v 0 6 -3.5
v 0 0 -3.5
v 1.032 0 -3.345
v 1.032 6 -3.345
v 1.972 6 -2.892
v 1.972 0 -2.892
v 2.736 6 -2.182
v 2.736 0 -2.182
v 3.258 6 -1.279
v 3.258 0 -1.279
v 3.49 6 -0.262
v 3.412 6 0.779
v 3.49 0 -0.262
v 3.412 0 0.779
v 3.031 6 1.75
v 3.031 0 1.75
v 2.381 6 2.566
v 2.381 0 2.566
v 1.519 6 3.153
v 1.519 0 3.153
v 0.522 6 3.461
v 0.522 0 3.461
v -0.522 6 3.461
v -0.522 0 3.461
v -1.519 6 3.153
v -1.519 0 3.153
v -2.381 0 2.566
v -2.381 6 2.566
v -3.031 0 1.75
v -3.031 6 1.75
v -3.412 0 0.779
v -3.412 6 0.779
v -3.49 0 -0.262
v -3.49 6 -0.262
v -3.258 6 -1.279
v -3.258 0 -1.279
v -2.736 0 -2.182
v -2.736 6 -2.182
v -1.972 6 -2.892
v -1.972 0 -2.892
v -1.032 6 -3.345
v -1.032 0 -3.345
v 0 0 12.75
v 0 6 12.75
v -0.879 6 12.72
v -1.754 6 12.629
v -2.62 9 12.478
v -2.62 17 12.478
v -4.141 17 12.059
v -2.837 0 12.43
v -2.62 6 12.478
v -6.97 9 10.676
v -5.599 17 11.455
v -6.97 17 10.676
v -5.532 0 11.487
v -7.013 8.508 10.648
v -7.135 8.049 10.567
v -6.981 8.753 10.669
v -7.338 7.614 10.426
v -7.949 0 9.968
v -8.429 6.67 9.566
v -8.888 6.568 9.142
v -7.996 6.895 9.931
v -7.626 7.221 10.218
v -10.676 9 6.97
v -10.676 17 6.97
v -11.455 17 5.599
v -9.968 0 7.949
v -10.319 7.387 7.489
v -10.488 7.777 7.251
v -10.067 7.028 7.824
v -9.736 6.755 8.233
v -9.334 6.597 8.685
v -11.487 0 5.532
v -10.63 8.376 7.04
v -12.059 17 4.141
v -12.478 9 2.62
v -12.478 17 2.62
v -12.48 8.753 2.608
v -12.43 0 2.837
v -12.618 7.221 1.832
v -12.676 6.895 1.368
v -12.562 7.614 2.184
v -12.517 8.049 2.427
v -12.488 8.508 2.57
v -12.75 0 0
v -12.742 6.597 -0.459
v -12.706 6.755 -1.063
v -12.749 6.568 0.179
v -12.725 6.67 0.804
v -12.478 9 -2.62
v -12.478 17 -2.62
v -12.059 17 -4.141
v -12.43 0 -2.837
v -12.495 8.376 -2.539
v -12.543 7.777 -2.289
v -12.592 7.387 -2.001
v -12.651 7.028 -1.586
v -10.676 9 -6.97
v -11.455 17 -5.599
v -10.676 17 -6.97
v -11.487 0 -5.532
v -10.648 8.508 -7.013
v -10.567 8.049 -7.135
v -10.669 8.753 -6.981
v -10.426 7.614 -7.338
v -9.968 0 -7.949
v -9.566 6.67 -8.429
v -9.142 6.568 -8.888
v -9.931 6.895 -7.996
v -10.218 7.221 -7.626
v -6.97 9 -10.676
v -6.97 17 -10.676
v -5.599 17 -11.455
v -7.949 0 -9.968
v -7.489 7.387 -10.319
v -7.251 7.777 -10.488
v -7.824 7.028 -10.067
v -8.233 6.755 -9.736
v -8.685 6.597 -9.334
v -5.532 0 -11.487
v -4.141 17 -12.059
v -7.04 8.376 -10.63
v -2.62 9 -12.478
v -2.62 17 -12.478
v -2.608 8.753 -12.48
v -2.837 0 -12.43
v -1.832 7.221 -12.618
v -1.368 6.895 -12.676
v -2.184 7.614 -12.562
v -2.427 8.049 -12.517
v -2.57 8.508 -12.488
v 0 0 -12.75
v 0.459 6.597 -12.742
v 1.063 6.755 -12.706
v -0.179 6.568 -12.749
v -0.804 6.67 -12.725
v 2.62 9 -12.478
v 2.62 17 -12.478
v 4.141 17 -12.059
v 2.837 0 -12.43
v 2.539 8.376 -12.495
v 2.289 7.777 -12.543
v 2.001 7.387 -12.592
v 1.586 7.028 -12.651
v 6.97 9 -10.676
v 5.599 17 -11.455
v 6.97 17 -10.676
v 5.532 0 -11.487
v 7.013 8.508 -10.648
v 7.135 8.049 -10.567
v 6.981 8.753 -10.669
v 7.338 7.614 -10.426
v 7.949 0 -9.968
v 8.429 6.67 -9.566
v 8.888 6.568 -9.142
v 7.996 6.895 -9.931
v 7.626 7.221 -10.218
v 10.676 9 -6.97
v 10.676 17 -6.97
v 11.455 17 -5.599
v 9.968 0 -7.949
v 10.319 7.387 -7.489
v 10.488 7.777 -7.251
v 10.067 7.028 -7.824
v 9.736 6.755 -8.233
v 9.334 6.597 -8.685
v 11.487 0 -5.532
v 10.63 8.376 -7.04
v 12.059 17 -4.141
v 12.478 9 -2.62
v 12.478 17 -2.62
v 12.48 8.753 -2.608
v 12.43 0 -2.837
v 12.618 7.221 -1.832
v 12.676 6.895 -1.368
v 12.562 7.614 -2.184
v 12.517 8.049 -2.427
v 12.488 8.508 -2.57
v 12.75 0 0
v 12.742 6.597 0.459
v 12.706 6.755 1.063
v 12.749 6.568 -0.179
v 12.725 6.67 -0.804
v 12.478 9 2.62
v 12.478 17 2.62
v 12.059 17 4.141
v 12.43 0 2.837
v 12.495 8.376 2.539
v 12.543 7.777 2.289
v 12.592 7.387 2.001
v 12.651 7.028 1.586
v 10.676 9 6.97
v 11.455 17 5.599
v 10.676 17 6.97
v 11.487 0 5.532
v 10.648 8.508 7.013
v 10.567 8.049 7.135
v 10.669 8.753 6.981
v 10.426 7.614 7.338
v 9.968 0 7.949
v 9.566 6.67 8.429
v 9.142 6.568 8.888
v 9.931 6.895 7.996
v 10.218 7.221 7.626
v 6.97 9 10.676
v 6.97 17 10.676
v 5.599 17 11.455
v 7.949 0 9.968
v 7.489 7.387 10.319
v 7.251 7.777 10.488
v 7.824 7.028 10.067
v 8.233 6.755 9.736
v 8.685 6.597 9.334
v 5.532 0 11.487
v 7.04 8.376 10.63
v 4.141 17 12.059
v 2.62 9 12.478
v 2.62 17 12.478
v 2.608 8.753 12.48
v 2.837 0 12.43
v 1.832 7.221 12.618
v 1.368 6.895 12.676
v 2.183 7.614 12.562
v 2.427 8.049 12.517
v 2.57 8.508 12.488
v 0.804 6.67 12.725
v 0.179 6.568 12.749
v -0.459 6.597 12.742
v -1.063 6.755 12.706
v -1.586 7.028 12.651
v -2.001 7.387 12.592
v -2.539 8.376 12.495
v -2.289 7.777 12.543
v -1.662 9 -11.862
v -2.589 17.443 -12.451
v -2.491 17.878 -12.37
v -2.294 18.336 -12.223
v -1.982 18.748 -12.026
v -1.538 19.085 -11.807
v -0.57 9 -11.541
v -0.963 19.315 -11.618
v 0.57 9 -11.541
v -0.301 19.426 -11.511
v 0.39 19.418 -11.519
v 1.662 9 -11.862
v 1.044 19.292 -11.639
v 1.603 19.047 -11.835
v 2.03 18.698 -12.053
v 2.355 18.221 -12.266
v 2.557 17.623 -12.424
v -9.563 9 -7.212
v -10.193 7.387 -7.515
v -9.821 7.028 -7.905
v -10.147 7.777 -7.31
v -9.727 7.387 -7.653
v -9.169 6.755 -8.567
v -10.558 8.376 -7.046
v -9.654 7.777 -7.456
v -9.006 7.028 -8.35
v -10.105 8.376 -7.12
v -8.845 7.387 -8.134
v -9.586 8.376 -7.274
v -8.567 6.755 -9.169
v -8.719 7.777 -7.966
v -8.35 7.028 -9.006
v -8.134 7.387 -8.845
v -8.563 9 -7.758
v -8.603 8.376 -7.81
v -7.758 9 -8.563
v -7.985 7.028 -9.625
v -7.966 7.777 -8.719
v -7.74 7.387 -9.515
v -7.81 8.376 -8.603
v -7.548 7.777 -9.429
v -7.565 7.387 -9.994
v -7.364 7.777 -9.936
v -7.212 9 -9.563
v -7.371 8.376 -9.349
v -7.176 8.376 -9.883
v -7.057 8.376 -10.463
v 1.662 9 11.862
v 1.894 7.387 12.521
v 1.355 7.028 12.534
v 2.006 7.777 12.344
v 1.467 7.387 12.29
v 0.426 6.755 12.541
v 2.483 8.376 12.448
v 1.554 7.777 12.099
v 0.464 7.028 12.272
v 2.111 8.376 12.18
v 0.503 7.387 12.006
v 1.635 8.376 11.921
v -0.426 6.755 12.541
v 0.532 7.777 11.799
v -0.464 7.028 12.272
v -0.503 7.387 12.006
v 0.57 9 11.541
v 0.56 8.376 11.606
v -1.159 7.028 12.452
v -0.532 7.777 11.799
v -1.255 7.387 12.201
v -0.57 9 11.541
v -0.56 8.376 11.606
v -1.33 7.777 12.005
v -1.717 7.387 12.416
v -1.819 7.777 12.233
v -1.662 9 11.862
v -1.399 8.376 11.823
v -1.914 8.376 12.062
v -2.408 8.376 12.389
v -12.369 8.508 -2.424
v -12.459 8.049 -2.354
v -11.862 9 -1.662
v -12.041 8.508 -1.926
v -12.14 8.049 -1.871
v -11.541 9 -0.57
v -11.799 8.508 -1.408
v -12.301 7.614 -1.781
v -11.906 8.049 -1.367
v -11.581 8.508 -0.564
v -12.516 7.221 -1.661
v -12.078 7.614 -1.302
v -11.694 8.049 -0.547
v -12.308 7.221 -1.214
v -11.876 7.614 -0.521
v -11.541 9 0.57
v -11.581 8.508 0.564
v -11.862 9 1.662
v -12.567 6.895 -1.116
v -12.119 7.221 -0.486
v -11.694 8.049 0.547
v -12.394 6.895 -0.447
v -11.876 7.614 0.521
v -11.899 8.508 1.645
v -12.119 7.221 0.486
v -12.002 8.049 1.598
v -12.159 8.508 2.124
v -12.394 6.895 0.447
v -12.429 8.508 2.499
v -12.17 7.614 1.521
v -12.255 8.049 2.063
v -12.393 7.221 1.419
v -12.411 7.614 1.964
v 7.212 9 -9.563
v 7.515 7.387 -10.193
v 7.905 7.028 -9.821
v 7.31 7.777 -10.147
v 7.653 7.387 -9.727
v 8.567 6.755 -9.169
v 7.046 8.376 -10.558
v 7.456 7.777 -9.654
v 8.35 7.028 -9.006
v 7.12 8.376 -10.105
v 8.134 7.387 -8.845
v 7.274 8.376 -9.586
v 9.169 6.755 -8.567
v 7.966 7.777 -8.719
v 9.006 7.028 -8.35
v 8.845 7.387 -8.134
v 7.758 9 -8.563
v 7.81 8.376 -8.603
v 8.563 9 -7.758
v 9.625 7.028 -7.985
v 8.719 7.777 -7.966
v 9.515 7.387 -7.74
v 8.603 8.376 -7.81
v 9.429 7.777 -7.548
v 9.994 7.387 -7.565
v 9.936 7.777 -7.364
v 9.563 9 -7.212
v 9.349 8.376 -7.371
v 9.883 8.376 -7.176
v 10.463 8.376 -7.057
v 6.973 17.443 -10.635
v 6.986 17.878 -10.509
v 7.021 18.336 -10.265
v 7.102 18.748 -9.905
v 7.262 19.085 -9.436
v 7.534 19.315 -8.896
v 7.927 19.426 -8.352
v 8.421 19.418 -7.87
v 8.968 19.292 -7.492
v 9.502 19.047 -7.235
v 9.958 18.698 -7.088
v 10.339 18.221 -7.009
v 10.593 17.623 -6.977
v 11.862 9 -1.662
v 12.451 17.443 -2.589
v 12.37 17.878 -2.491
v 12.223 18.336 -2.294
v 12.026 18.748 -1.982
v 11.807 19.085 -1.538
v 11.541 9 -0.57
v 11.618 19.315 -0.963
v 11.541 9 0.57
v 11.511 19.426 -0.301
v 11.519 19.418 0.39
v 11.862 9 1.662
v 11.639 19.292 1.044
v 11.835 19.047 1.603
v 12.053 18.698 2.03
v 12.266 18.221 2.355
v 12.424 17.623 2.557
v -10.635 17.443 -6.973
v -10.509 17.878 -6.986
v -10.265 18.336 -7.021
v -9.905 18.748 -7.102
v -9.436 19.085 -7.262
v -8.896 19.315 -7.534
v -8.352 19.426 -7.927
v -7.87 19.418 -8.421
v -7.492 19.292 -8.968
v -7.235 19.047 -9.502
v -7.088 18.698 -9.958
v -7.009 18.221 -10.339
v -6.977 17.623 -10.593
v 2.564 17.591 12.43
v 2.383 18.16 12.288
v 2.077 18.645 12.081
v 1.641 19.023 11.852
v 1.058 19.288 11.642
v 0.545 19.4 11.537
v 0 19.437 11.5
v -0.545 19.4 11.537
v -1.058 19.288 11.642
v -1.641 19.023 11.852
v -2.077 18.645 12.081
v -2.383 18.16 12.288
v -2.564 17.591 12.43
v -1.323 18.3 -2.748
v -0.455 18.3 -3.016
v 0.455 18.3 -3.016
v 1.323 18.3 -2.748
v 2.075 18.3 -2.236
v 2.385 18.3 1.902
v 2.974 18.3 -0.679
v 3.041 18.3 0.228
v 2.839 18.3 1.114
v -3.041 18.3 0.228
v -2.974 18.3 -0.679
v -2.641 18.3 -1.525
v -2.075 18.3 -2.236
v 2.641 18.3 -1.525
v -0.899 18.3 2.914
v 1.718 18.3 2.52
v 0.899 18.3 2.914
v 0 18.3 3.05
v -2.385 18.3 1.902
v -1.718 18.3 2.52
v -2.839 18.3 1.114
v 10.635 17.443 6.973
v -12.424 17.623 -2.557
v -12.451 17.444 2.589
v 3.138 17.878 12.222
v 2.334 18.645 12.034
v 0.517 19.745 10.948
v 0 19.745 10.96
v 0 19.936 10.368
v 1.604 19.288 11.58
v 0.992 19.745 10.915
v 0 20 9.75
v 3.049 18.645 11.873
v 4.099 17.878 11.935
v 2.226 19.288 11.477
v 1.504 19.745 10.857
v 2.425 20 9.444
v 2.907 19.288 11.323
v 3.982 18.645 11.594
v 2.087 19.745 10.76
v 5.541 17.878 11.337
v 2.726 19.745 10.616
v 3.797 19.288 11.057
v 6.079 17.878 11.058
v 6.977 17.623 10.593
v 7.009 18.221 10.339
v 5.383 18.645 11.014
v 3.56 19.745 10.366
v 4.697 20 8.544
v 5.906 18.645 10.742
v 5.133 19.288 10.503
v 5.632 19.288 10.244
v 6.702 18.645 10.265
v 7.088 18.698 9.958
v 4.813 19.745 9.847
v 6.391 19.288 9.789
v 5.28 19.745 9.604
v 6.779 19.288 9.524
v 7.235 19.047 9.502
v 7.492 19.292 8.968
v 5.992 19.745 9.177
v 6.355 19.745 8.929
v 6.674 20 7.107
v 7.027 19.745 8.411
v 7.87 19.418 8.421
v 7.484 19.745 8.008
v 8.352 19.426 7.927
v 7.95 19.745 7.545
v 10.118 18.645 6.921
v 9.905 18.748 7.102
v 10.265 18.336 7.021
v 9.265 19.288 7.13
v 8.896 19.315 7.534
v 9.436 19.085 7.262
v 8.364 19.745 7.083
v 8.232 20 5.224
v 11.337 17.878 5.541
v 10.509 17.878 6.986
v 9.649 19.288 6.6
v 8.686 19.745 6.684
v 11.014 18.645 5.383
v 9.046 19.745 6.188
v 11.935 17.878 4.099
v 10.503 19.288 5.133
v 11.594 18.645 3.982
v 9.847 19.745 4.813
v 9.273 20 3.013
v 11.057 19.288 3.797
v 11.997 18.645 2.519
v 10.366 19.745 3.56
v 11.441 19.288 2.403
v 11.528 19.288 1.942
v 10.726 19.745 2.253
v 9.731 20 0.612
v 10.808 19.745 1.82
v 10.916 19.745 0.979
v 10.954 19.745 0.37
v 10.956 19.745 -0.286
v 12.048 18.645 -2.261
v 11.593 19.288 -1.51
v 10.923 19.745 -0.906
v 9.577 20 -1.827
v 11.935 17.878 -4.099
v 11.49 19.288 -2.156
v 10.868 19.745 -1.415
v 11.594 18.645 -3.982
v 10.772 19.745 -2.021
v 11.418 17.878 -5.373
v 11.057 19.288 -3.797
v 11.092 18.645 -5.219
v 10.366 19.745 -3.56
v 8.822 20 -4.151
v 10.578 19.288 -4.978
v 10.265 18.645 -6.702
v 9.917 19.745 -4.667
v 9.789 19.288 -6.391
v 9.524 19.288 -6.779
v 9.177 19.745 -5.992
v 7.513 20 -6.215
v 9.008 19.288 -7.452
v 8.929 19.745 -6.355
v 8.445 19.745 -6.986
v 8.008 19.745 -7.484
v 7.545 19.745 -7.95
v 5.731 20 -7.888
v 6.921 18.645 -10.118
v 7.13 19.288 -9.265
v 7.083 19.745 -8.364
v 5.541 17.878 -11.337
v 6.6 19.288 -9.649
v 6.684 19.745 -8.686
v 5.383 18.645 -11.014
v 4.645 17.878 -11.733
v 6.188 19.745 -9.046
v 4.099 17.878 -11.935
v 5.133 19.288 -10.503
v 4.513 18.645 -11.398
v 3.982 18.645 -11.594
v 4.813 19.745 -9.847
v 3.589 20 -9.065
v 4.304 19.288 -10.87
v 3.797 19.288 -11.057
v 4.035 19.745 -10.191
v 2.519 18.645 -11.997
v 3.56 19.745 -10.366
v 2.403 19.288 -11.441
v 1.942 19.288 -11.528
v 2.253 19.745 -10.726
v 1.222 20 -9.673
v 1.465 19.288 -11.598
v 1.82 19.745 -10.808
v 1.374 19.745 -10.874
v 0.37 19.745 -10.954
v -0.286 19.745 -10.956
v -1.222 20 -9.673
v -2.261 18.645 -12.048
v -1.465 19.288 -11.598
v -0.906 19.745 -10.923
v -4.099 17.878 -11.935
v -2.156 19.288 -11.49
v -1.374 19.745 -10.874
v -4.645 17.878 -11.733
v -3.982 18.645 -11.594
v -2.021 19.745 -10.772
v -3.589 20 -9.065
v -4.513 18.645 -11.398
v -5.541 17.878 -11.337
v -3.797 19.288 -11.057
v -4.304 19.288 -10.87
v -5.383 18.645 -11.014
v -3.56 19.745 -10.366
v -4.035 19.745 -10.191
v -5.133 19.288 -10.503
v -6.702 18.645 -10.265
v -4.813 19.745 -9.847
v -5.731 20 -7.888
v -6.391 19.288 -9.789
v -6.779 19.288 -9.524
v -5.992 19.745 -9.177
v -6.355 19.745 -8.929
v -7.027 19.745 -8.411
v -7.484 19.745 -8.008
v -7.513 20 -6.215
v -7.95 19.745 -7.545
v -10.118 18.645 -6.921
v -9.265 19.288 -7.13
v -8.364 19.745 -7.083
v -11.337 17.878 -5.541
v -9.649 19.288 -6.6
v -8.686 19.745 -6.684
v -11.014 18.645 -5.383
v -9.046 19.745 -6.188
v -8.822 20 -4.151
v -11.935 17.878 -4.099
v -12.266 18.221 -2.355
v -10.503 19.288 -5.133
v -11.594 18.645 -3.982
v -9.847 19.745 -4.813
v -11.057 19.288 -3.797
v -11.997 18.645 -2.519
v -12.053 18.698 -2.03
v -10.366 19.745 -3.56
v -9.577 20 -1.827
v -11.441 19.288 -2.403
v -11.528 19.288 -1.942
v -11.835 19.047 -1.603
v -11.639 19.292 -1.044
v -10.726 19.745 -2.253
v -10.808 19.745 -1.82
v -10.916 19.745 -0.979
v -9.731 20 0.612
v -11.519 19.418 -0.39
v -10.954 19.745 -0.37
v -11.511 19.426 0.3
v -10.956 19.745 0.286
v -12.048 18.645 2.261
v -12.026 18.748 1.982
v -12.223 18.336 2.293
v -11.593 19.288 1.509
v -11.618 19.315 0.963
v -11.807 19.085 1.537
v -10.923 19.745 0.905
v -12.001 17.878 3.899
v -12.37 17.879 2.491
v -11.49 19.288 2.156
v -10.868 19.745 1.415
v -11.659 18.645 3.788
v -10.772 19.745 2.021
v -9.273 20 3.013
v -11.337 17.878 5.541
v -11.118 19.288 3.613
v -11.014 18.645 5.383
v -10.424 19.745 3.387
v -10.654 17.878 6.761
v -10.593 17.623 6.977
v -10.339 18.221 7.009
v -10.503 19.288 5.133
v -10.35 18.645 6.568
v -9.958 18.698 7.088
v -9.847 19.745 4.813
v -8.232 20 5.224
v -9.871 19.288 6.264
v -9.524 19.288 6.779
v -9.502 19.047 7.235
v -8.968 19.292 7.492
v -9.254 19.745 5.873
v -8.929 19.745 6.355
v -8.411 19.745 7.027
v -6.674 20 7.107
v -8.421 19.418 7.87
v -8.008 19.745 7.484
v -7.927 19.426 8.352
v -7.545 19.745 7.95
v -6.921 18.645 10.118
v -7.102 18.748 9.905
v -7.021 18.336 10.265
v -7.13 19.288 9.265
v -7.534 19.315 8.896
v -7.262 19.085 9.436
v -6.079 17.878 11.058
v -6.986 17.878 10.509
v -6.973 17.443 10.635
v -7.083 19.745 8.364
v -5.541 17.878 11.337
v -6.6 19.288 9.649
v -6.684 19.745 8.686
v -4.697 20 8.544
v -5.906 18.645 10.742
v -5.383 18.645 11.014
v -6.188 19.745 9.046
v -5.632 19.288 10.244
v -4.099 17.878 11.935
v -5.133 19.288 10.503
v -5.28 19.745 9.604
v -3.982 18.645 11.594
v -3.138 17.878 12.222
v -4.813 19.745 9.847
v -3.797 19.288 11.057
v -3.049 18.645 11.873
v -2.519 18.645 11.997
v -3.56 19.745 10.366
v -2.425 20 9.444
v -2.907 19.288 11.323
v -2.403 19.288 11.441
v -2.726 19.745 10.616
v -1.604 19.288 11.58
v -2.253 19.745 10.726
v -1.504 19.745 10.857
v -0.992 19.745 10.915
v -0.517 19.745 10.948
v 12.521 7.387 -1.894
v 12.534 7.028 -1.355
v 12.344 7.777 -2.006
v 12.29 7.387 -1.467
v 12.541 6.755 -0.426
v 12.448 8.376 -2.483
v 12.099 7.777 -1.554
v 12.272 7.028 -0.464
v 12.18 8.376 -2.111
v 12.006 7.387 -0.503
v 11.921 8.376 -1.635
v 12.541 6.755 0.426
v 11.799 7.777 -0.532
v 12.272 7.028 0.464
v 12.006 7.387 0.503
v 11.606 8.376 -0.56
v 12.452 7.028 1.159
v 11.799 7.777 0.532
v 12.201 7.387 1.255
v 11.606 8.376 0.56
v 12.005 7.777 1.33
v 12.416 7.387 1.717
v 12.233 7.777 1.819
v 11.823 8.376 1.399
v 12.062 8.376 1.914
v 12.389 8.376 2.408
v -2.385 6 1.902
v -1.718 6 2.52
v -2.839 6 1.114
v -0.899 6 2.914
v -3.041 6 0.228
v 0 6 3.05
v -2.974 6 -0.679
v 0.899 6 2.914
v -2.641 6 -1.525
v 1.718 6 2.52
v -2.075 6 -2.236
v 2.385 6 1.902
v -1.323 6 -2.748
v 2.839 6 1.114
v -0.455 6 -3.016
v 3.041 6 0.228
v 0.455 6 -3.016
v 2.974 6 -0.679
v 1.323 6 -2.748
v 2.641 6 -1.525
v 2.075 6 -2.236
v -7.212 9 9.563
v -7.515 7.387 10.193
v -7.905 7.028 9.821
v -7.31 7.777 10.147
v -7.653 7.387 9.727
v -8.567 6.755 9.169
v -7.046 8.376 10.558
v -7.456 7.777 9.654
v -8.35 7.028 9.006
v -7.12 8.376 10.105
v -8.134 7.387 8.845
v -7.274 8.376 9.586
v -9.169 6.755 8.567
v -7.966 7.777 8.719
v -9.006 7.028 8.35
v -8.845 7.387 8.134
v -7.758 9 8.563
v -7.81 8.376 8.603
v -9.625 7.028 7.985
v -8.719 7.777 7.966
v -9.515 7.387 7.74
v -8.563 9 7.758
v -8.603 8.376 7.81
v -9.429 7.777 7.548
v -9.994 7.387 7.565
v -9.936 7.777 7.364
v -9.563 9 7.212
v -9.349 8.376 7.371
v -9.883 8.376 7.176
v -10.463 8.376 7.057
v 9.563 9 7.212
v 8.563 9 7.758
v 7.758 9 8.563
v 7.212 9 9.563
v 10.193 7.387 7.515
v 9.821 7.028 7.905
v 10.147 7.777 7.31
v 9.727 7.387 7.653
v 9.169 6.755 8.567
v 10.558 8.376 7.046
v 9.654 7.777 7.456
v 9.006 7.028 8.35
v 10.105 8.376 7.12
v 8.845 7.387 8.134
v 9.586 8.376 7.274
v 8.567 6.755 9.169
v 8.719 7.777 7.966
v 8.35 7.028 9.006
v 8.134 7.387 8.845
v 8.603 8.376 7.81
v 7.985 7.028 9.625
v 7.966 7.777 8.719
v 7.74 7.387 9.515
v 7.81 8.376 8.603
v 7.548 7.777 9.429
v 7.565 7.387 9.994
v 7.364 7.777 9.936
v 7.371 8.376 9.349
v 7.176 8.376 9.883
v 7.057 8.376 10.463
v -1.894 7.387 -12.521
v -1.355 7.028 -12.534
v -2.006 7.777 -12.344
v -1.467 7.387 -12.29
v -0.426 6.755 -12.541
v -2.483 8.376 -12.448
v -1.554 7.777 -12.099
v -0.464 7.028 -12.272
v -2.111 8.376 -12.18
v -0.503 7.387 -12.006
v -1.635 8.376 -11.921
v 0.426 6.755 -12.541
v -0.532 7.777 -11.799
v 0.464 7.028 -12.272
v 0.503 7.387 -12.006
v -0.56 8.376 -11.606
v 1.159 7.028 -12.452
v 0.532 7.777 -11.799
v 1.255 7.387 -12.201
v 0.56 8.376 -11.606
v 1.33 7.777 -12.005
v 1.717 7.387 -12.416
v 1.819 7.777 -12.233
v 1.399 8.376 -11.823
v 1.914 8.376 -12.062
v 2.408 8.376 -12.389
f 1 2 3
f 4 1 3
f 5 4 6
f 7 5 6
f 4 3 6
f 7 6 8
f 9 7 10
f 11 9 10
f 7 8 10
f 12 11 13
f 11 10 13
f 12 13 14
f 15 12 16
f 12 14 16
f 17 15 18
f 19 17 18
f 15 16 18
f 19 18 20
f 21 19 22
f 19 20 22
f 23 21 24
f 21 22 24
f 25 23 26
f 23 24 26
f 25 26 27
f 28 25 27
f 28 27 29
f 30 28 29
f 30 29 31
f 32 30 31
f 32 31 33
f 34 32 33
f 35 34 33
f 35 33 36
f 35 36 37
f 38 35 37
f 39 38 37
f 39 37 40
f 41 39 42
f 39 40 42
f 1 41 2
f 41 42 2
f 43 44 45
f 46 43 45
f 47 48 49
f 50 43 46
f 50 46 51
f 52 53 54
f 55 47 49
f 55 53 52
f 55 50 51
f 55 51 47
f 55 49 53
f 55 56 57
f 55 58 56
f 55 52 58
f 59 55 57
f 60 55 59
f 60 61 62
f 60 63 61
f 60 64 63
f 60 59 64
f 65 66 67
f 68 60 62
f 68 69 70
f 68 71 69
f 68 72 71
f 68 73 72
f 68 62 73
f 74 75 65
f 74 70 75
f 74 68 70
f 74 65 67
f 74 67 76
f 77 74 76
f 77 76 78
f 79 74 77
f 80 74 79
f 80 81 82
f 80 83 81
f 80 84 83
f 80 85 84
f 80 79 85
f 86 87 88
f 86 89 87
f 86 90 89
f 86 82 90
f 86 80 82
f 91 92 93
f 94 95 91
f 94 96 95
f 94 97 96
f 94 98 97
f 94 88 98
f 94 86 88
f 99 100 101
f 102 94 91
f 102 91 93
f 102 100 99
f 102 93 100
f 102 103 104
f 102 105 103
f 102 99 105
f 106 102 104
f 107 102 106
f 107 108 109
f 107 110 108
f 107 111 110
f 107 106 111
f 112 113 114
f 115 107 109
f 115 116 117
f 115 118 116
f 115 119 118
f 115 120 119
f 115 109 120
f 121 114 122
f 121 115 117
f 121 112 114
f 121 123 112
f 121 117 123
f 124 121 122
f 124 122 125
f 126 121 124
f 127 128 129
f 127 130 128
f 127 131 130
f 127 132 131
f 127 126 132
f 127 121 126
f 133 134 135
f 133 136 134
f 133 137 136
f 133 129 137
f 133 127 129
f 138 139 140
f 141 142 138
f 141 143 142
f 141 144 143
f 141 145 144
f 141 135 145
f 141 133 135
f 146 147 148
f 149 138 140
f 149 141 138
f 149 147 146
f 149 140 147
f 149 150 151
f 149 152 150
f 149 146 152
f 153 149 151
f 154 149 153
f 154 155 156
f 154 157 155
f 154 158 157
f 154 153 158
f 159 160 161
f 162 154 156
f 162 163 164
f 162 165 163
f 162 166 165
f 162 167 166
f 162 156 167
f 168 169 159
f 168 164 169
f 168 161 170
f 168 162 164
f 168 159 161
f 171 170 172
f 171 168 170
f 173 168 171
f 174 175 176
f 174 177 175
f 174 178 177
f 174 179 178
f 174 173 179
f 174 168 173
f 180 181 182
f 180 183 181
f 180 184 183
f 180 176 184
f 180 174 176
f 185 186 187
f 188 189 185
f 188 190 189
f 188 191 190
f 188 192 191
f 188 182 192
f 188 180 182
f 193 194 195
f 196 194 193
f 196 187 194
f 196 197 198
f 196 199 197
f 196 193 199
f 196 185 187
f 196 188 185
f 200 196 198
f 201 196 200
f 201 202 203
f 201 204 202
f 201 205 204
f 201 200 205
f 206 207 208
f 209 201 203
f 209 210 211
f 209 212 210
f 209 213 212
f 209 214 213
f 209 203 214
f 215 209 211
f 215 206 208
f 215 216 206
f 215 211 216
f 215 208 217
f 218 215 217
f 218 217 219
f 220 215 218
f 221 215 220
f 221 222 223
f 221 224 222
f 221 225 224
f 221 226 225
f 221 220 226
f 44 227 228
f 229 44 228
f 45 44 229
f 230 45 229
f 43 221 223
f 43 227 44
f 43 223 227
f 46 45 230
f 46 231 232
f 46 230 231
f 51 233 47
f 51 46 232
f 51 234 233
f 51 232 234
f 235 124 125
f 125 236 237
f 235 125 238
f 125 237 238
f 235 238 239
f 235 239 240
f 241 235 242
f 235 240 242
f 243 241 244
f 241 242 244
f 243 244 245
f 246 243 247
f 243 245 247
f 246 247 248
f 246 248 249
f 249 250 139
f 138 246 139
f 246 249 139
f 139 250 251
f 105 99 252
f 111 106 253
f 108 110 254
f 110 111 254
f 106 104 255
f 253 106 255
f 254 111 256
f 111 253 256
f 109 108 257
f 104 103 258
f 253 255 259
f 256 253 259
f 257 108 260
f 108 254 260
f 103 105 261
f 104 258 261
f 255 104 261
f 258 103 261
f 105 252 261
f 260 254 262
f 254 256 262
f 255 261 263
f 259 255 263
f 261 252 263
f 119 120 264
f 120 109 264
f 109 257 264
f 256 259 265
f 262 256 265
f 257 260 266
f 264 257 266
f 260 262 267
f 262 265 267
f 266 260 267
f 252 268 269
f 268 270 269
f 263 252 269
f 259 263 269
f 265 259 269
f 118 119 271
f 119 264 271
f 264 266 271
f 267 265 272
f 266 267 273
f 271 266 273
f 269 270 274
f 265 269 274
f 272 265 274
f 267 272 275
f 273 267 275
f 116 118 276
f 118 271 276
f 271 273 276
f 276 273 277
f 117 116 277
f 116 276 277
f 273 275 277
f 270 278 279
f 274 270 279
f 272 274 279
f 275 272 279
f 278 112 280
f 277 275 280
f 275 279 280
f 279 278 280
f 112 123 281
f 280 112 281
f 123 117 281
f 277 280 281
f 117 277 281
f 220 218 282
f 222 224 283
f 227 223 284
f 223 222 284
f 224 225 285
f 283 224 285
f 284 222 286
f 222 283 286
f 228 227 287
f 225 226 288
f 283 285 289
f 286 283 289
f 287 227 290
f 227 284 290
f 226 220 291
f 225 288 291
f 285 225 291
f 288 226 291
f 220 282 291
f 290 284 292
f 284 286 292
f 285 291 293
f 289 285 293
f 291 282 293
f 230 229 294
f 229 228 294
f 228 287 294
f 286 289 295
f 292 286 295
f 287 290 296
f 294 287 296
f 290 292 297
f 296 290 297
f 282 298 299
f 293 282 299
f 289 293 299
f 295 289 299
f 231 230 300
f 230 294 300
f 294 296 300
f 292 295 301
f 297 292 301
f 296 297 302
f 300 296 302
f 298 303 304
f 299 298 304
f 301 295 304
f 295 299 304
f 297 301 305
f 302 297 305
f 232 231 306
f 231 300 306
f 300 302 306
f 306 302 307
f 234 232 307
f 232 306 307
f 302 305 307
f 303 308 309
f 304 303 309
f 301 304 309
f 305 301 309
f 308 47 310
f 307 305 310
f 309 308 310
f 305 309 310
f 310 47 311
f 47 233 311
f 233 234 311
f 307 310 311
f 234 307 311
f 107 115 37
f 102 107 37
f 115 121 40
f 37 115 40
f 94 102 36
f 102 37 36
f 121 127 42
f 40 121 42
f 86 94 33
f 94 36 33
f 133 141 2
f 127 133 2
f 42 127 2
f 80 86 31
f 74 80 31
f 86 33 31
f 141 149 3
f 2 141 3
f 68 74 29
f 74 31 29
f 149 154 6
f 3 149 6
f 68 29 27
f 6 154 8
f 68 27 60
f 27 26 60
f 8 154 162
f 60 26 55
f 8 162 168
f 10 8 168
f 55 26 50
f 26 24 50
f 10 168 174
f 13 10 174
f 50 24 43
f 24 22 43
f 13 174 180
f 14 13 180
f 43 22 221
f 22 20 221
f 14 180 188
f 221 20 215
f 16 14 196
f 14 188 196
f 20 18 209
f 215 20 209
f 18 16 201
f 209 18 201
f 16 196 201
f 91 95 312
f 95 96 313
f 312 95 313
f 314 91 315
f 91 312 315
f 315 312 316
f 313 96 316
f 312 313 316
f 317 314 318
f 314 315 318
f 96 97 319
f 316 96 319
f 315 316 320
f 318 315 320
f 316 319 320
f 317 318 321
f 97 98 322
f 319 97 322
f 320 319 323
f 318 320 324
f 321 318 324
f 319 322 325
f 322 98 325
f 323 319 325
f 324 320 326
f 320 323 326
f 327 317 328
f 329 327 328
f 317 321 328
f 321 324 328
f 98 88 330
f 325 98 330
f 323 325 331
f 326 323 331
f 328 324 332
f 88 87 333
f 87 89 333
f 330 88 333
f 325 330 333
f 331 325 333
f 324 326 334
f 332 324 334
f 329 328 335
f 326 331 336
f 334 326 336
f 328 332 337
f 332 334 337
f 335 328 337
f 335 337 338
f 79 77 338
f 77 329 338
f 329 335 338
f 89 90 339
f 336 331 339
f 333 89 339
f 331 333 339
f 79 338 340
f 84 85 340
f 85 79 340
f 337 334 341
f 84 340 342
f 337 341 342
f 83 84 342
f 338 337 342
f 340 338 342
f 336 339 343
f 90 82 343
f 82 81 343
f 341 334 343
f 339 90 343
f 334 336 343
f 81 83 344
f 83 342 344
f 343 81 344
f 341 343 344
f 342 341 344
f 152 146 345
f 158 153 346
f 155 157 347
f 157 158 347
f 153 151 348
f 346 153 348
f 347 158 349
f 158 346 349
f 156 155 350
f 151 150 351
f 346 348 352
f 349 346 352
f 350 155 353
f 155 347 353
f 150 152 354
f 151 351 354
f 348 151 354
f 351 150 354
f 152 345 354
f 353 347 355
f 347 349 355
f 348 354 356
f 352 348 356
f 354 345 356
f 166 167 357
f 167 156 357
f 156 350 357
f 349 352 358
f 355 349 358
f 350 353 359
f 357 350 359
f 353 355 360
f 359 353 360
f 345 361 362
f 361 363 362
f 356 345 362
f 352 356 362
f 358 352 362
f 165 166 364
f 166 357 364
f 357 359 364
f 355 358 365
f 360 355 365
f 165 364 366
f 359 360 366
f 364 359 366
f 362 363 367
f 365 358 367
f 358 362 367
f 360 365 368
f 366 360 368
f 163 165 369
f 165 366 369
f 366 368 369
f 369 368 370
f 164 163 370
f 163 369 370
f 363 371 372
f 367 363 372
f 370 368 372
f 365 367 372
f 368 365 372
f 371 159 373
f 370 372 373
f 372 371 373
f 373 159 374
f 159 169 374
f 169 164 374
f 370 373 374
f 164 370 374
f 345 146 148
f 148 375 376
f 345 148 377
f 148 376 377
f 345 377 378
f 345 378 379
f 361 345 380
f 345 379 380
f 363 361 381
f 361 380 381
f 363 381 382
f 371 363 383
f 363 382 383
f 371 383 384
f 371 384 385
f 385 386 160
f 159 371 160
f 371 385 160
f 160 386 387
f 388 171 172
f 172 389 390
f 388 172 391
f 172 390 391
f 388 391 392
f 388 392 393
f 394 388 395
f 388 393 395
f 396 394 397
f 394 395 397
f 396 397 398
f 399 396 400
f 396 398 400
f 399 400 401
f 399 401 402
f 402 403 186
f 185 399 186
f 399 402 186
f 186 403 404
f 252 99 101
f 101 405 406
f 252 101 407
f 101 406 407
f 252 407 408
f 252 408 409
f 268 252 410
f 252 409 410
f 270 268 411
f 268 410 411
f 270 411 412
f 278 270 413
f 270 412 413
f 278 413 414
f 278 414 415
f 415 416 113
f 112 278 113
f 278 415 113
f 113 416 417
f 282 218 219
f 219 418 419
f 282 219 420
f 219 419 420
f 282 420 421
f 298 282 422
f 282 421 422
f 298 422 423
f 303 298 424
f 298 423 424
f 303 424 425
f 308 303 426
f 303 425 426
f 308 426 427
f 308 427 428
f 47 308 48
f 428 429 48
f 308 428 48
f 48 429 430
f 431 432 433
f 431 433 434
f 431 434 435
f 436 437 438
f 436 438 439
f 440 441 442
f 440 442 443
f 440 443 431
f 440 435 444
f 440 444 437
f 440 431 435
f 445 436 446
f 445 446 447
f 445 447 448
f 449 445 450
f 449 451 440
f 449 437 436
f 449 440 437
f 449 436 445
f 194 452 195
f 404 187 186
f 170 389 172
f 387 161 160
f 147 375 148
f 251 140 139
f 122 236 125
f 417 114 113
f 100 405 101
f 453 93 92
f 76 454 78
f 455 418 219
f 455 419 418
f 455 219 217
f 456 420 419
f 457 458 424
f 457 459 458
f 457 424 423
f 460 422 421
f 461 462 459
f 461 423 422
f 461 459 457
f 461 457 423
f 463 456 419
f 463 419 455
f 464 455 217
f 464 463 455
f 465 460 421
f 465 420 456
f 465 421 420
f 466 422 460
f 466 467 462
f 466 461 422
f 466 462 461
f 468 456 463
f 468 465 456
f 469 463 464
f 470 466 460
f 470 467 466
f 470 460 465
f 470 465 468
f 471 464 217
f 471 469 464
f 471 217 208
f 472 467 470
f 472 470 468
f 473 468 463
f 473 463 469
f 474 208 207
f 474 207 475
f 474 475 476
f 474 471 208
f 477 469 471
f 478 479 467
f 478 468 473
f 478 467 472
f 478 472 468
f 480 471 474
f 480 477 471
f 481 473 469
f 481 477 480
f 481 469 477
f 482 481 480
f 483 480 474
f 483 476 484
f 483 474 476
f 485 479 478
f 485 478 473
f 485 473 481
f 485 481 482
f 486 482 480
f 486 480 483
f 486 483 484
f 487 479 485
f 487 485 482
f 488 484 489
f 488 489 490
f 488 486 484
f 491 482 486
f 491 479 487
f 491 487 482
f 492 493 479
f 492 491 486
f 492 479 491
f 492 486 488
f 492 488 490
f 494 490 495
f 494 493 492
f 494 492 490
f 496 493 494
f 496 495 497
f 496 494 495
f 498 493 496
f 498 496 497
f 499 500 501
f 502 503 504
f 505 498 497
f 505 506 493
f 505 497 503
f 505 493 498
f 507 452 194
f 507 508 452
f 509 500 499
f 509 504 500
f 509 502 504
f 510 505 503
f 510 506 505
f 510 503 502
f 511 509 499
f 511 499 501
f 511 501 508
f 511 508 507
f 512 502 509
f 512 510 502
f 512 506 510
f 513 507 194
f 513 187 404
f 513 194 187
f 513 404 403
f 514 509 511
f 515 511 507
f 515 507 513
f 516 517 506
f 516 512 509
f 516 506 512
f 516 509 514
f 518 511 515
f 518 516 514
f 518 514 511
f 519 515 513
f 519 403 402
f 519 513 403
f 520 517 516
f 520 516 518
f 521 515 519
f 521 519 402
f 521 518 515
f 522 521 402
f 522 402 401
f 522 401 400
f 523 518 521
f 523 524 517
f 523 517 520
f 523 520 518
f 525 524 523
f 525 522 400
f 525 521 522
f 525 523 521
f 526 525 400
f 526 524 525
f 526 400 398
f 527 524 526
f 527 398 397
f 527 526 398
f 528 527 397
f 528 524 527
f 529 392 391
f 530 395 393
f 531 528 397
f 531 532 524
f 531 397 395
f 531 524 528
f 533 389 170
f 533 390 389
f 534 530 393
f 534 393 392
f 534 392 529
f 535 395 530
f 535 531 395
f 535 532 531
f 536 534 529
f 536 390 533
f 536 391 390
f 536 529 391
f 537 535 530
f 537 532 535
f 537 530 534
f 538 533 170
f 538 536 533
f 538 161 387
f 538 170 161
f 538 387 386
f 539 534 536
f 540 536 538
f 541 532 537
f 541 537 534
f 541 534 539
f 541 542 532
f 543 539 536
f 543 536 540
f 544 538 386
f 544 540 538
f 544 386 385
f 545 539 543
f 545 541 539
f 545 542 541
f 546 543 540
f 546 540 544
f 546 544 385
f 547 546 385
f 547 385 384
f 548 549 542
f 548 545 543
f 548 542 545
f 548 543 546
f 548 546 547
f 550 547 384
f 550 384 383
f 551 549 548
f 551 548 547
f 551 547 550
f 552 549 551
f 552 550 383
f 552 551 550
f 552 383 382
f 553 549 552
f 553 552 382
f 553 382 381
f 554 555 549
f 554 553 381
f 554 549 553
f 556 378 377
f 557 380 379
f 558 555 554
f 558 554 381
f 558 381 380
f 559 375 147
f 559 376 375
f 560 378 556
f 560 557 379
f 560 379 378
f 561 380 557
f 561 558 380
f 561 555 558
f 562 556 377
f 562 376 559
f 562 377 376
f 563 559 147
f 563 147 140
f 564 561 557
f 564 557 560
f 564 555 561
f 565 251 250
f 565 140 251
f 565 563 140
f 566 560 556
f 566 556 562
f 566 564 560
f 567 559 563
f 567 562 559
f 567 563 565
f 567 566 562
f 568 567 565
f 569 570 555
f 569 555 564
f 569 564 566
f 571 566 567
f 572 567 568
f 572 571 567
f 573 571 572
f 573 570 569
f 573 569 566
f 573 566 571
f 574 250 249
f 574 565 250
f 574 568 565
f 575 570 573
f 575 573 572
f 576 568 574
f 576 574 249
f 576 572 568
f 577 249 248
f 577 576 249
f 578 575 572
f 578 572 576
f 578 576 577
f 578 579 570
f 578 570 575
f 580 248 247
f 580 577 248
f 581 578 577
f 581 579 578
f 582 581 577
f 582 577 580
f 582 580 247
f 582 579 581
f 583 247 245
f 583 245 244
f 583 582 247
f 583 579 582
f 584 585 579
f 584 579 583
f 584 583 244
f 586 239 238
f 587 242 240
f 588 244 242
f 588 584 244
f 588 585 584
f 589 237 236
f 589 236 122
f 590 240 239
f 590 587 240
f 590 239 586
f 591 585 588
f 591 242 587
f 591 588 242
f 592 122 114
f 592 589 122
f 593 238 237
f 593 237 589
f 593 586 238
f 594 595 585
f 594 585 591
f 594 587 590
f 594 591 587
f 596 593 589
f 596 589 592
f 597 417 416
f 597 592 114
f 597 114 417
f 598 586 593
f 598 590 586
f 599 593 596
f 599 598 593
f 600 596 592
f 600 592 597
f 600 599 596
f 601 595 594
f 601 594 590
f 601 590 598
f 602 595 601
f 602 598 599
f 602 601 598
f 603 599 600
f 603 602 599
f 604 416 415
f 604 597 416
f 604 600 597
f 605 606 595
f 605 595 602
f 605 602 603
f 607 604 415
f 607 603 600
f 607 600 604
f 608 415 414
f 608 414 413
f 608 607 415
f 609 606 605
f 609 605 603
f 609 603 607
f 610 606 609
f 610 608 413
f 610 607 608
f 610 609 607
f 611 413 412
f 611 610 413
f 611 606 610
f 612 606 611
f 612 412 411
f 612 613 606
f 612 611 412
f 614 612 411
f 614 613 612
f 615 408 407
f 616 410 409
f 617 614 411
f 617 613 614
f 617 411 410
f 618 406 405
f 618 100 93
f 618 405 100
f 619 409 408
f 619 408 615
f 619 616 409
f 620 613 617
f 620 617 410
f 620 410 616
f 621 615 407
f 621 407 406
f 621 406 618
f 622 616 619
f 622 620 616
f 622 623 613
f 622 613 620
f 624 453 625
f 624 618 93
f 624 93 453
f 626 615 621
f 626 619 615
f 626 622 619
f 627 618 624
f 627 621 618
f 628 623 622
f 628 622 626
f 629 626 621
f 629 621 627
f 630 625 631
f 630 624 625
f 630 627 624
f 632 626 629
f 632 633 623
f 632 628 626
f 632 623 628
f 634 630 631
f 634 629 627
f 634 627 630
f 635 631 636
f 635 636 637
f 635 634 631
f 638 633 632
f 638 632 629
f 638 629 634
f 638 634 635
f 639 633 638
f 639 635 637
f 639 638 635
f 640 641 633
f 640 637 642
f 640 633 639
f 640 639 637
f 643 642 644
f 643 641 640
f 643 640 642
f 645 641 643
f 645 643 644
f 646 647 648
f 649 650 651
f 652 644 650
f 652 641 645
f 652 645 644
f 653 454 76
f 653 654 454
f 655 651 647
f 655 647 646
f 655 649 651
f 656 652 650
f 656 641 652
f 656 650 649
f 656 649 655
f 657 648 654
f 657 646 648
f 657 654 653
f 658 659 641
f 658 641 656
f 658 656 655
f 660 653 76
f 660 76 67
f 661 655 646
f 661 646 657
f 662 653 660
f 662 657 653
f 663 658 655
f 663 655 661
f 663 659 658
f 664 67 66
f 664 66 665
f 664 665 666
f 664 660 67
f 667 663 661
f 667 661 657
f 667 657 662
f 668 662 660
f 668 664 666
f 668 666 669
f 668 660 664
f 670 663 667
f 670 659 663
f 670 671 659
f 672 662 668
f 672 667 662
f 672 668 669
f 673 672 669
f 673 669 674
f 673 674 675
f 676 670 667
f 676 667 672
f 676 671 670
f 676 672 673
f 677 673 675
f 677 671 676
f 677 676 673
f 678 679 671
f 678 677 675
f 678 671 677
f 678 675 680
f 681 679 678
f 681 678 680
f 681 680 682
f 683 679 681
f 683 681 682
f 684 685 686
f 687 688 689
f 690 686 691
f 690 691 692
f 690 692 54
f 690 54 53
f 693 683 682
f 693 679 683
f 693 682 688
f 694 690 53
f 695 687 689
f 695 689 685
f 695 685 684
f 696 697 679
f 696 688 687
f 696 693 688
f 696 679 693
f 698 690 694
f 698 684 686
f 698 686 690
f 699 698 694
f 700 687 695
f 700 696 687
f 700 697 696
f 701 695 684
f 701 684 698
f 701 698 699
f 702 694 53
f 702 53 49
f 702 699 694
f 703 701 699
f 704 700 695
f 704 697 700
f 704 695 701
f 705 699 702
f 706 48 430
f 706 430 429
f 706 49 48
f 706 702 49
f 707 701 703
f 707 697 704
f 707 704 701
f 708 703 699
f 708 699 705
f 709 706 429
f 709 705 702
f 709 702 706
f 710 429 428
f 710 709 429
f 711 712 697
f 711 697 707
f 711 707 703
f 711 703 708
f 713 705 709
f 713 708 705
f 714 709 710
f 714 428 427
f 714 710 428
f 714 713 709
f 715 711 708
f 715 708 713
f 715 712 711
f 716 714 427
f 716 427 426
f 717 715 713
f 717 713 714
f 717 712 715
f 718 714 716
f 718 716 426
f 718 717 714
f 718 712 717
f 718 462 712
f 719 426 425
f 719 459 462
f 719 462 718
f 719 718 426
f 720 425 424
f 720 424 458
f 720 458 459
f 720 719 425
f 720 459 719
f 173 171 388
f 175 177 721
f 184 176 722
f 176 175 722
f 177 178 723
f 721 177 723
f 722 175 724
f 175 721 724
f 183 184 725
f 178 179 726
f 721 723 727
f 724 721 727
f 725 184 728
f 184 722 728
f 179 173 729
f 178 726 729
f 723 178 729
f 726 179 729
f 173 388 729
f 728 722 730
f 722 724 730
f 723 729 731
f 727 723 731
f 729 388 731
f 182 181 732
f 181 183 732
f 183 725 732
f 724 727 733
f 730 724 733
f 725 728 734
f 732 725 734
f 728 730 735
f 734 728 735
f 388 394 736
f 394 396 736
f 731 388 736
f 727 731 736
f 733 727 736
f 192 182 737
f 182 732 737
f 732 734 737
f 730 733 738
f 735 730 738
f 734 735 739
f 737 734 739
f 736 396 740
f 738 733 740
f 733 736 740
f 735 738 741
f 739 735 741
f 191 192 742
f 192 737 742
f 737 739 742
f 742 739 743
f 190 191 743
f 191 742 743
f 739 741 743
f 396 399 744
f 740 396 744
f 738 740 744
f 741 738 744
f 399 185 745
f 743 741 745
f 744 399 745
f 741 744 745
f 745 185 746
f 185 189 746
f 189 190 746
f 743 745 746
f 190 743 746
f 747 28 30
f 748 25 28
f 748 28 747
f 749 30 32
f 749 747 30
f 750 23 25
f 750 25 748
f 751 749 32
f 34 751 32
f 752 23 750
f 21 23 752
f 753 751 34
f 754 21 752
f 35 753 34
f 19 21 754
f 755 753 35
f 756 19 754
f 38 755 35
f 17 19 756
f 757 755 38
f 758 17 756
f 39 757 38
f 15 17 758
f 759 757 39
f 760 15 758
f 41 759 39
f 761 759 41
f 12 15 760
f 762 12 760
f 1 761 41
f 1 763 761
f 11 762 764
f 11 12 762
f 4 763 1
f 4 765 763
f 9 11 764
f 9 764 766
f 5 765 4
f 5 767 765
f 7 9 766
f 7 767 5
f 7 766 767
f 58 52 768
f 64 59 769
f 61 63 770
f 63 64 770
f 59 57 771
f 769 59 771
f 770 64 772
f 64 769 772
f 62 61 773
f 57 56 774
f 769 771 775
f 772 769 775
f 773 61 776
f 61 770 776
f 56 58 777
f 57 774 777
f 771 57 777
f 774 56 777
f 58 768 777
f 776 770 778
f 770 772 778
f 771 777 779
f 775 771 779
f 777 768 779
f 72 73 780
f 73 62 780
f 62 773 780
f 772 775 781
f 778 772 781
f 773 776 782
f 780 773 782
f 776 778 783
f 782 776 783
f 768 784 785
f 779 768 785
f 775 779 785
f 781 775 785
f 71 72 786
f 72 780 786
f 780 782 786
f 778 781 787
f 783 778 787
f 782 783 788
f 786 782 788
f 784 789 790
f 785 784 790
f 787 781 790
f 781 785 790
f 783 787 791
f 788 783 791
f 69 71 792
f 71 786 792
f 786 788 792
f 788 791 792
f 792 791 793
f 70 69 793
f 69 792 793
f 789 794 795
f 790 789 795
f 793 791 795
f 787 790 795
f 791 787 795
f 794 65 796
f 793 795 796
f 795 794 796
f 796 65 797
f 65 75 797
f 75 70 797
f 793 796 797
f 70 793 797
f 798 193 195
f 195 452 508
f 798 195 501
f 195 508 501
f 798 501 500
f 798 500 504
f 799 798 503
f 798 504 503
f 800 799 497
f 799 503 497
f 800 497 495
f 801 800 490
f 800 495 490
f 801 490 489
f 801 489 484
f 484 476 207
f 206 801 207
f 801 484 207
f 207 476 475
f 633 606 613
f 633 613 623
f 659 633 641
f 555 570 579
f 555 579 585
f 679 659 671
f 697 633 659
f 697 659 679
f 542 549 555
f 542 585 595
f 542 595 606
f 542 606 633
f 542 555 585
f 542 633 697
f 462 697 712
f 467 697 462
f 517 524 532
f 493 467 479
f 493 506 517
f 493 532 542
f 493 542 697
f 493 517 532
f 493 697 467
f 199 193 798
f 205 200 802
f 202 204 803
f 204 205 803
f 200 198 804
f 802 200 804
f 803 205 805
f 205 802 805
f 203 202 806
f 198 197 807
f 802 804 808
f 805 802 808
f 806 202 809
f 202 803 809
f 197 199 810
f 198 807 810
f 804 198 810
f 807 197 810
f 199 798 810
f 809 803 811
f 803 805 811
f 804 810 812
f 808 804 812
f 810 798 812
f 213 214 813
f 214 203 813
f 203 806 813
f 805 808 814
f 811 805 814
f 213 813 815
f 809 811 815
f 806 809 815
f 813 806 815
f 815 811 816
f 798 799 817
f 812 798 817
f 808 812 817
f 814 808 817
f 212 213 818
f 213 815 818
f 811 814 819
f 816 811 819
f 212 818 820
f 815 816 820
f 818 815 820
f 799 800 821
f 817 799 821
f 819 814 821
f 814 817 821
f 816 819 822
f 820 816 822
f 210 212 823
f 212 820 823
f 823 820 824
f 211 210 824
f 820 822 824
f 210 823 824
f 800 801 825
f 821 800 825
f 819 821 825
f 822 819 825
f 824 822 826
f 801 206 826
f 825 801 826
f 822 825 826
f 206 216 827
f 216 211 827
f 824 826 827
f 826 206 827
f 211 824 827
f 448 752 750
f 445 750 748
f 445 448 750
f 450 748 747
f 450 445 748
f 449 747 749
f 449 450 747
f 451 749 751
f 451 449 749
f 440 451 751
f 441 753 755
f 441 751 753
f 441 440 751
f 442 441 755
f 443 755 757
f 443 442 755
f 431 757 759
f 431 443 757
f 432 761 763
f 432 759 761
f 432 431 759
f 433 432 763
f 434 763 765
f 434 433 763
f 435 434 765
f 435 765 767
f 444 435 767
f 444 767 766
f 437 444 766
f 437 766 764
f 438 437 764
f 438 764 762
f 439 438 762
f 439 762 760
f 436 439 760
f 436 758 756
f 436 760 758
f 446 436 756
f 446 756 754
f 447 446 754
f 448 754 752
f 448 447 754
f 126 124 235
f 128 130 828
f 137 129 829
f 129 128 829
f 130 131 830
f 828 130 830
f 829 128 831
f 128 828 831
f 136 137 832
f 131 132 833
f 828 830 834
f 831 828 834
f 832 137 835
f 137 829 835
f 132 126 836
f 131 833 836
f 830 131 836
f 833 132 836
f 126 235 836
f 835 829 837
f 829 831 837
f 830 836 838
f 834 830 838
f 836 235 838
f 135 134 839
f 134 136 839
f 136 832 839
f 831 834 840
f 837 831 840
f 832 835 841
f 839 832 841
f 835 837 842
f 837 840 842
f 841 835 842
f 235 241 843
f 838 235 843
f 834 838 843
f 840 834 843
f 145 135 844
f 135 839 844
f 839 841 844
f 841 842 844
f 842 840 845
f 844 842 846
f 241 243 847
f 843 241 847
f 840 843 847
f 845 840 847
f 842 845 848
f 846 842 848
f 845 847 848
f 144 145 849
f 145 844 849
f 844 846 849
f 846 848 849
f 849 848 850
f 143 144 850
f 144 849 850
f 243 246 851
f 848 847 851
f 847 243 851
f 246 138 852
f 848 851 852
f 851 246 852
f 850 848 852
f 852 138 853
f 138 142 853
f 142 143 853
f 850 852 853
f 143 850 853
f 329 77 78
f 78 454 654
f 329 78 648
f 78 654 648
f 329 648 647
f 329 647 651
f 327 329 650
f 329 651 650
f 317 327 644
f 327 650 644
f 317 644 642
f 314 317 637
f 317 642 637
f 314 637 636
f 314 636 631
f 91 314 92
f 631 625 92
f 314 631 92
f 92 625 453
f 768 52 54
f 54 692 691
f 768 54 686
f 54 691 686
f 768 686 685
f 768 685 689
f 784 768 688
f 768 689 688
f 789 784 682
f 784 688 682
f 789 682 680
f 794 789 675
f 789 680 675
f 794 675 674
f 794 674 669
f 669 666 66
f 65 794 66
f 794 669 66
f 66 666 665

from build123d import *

# Parameters (mm, degrees)
SKETCH1_R               = 12.75
BOSS_EXTRUDE1_DEPTH     = 20
CUT_EXTRUDE1_DEPTH      = 27.928145127
CUT_EXTRUDE1_DEPTH_BACK = 18.3
SKETCH2_R               = 3.05
SKETCH3_R               = 3.5
CUT_EXTRUDE2_DEPTH      = 6
FILLET1_R               = 3
SKETCH5_R               = 4
CUT_EXTRUDE3_DEPTH      = 14
FILLET3_R               = 3


with BuildPart() as part:
    # Sketch1 → Boss-Extrude1 (new body)
    with BuildSketch(Plane(origin=(0, 0, 0), x_dir=(1, 0, 0), z_dir=(0, 1, 0))):
        with Locations(Location((0, 0, 0), (0, 0, 270))):
            Circle(SKETCH1_R)
    extrude(amount=BOSS_EXTRUDE1_DEPTH)

    # Sketch2 → Cut-Extrude1 (cut, two sides: drawn at the far end of the back side and taken through both)
    with BuildSketch(Plane.XZ.offset(-CUT_EXTRUDE1_DEPTH_BACK)):
        with Locations(Location((0, 0, 0), (0, 0, 90))):
            Circle(SKETCH2_R)
    extrude(amount=CUT_EXTRUDE1_DEPTH + CUT_EXTRUDE1_DEPTH_BACK, mode=Mode.SUBTRACT)

    # Sketch3 → Cut-Extrude2 (cut)
    with BuildSketch(Plane.XZ):
        with Locations(Location((0, 0, 0), (0, 0, 270))):
            Circle(SKETCH3_R)
    extrude(amount=-CUT_EXTRUDE2_DEPTH, mode=Mode.SUBTRACT)

    # Fillet1
    fillet1_edges = [part.edges().sort_by_distance(p)[0] for p in [
        (0, 20, -12.75),
    ]]
    fillet(fillet1_edges, radius=FILLET1_R)

    # Sketch5 → Cut-Extrude3 (cut)
    with BuildSketch(Plane(origin=(0, 20, 0), x_dir=(1, 0, 0), z_dir=(0, 1, 0))):
        with Locations((0, 15.5)):
            Circle(SKETCH5_R)
        with Locations((10.960155108, 10.960155108)):
            Circle(SKETCH5_R)
        with Locations((15.5, 0)):
            Circle(SKETCH5_R)
        with Locations((10.960155108, -10.960155108)):
            Circle(SKETCH5_R)
        with Locations((0, -15.5)):
            Circle(SKETCH5_R)
        with Locations((-10.960155108, -10.960155108)):
            Circle(SKETCH5_R)
        with Locations((-15.5, 0)):
            Circle(SKETCH5_R)
        with Locations((-10.960155108, 10.960155108)):
            Circle(SKETCH5_R)
    extrude(amount=-CUT_EXTRUDE3_DEPTH, mode=Mode.SUBTRACT)

    # Fillet3
    # the kernel refuses this fillet: 3 mm, written as the material it adds along each edge
    with BuildSketch(Plane(origin=(0, 6, 15.5), x_dir=(0.5240999982324142, 0, 0.8516567335803691), z_dir=(-0.8516567335803691, 0, 0.5240999982324142))) as fillet3_piece_1_section:
        with BuildLine():
            CenterArc((4 - FILLET3_R, FILLET3_R), FILLET3_R, 270, 90)
            Line((4 - FILLET3_R, 0), (4, 0))
            Line((4, 0), (4, FILLET3_R))
        make_face()
    fillet3_piece_1 = revolve(axis=Axis((0, 6, 15.5), (0, 1, 0)), revolution_arc=296.784649365, mode=Mode.PRIVATE)
    fillet3_piece_1 = fillet3_piece_1 & Plane(origin=(0, 6.906503108, 0), x_dir=(0, 0, 1), z_dir=(0, -1, 0)) * Cylinder(12.75, 17, mode=Mode.PRIVATE)
    add(fillet3_piece_1)
    with BuildSketch(Plane(origin=(-10.960155108, 6, 10.960155108), x_dir=(-0.2316175887878651, 0, 0.9728069143278617), z_dir=(-0.9728069143278617, 0, -0.2316175887878651))) as fillet3_piece_2_section:
        with BuildLine():
            CenterArc((4 - FILLET3_R, FILLET3_R), FILLET3_R, 270, 90)
            Line((4, FILLET3_R), (4, 0))
            Line((4, 0), (4 - FILLET3_R, 0))
        make_face()
    fillet3_piece_2 = revolve(axis=Axis((-10.960155108, 6, 10.960155108), (0, 1, 0)), revolution_arc=296.784649365, mode=Mode.PRIVATE)
    fillet3_piece_2 = fillet3_piece_2 & Plane(origin=(0, 6.906501973, 0), x_dir=(0, 0, 1), z_dir=(0, -1, 0)) * Cylinder(12.75, 16, mode=Mode.PRIVATE)
    add(fillet3_piece_2)
    with BuildSketch(Plane(origin=(-15.5, 6, 0), x_dir=(-0.8516567335803689, 0, -0.524099998232414), z_dir=(-0.524099998232414, 0, 0.8516567335803689))) as fillet3_piece_3_section:
        with BuildLine():
            CenterArc((4 - FILLET3_R, -FILLET3_R), FILLET3_R, 0, 90)
            Line((4, -FILLET3_R), (4, 0))
            Line((4, 0), (4 - FILLET3_R, 0))
        make_face()
    fillet3_piece_3 = revolve(axis=Axis((-15.5, 6, 0), (0, -1, 0)), revolution_arc=296.784649365, mode=Mode.PRIVATE)
    fillet3_piece_3 = fillet3_piece_3 & Plane(origin=(0, 6.90650195, 0), x_dir=(0, 0, 1), z_dir=(0, -1, 0)) * Cylinder(12.75, 16, mode=Mode.PRIVATE)
    add(fillet3_piece_3)
    with BuildSketch(Plane(origin=(-10.960155108, 6, -10.960155108), x_dir=(-0.9728069143278615, 0, -0.23161758878786548), z_dir=(0.23161758878786548, 0, -0.9728069143278615))) as fillet3_piece_4_section:
        with BuildLine():
            CenterArc((4 - FILLET3_R, FILLET3_R), FILLET3_R, 270, 90)
            Line((4, FILLET3_R), (4, 0))
            Line((4, 0), (4 - FILLET3_R, 0))
        make_face()
    fillet3_piece_4 = revolve(axis=Axis((-10.960155108, 6, -10.960155108), (0, 1, 0)), revolution_arc=296.784649365, mode=Mode.PRIVATE)
    fillet3_piece_4 = fillet3_piece_4 & Plane(origin=(0, 6.906501973, 0), x_dir=(0, 0, 1), z_dir=(0, -1, 0)) * Cylinder(12.75, 17, mode=Mode.PRIVATE)
    add(fillet3_piece_4)
    with BuildSketch(Plane(origin=(0, 6, -15.5), x_dir=(-0.5240999982324135, 0, -0.8516567335803694), z_dir=(0.8516567335803694, 0, -0.5240999982324135))) as fillet3_piece_5_section:
        with BuildLine():
            CenterArc((4 - FILLET3_R, FILLET3_R), FILLET3_R, 270, 90)
            Line((4, FILLET3_R), (4, 0))
            Line((4, 0), (4 - FILLET3_R, 0))
        make_face()
    fillet3_piece_5 = revolve(axis=Axis((0, 6, -15.5), (0, 1, 0)), revolution_arc=296.784649365, mode=Mode.PRIVATE)
    fillet3_piece_5 = fillet3_piece_5 & Plane(origin=(0, 6.906501973, 0), x_dir=(0, 0, 1), z_dir=(0, -1, 0)) * Cylinder(12.75, 16, mode=Mode.PRIVATE)
    add(fillet3_piece_5)
    with BuildSketch(Plane(origin=(10.960155108, 6, -10.960155108), x_dir=(0.2316175887878651, 0, -0.9728069143278617), z_dir=(0.9728069143278617, 0, 0.2316175887878651))) as fillet3_piece_6_section:
        with BuildLine():
            CenterArc((4 - FILLET3_R, FILLET3_R), FILLET3_R, 270, 90)
            Line((4, FILLET3_R), (4, 0))
            Line((4, 0), (4 - FILLET3_R, 0))
        make_face()
    fillet3_piece_6 = revolve(axis=Axis((10.960155108, 6, -10.960155108), (0, 1, 0)), revolution_arc=296.784649365, mode=Mode.PRIVATE)
    fillet3_piece_6 = fillet3_piece_6 & Plane(origin=(0, 6.906501973, 0), x_dir=(0, 0, 1), z_dir=(0, -1, 0)) * Cylinder(12.75, 16, mode=Mode.PRIVATE)
    add(fillet3_piece_6)
    with BuildSketch(Plane(origin=(15.5, 6, 0), x_dir=(0.8516567335803694, 0, -0.5240999982324135), z_dir=(0.5240999982324135, 0, 0.8516567335803694))) as fillet3_piece_7_section:
        with BuildLine():
            CenterArc((4 - FILLET3_R, FILLET3_R), FILLET3_R, 270, 90)
            Line((4, FILLET3_R), (4, 0))
            Line((4, 0), (4 - FILLET3_R, 0))
        make_face()
    fillet3_piece_7 = revolve(axis=Axis((15.5, 6, 0), (0, 1, 0)), revolution_arc=296.784649365, mode=Mode.PRIVATE)
    fillet3_piece_7 = fillet3_piece_7 & Plane(origin=(0, 6.906501973, 0), x_dir=(0, 0, 1), z_dir=(0, -1, 0)) * Cylinder(12.75, 17, mode=Mode.PRIVATE)
    add(fillet3_piece_7)
    with BuildSketch(Plane(origin=(10.960155108, 6, 10.960155108), x_dir=(0.9728069143278617, 0, 0.2316175887878651), z_dir=(-0.2316175887878651, 0, 0.9728069143278617))) as fillet3_piece_8_section:
        with BuildLine():
            CenterArc((4 - FILLET3_R, FILLET3_R), FILLET3_R, 270, 90)
            Line((4, FILLET3_R), (4, 0))
            Line((4, 0), (4 - FILLET3_R, 0))
        make_face()
    fillet3_piece_8 = revolve(axis=Axis((10.960155108, 6, 10.960155108), (0, 1, 0)), revolution_arc=296.784649365, mode=Mode.PRIVATE)
    fillet3_piece_8 = fillet3_piece_8 & Plane(origin=(0, 6.906501973, 0), x_dir=(0, 0, 1), z_dir=(0, -1, 0)) * Cylinder(12.75, 16, mode=Mode.PRIVATE)
    add(fillet3_piece_8)


solid = part.part
